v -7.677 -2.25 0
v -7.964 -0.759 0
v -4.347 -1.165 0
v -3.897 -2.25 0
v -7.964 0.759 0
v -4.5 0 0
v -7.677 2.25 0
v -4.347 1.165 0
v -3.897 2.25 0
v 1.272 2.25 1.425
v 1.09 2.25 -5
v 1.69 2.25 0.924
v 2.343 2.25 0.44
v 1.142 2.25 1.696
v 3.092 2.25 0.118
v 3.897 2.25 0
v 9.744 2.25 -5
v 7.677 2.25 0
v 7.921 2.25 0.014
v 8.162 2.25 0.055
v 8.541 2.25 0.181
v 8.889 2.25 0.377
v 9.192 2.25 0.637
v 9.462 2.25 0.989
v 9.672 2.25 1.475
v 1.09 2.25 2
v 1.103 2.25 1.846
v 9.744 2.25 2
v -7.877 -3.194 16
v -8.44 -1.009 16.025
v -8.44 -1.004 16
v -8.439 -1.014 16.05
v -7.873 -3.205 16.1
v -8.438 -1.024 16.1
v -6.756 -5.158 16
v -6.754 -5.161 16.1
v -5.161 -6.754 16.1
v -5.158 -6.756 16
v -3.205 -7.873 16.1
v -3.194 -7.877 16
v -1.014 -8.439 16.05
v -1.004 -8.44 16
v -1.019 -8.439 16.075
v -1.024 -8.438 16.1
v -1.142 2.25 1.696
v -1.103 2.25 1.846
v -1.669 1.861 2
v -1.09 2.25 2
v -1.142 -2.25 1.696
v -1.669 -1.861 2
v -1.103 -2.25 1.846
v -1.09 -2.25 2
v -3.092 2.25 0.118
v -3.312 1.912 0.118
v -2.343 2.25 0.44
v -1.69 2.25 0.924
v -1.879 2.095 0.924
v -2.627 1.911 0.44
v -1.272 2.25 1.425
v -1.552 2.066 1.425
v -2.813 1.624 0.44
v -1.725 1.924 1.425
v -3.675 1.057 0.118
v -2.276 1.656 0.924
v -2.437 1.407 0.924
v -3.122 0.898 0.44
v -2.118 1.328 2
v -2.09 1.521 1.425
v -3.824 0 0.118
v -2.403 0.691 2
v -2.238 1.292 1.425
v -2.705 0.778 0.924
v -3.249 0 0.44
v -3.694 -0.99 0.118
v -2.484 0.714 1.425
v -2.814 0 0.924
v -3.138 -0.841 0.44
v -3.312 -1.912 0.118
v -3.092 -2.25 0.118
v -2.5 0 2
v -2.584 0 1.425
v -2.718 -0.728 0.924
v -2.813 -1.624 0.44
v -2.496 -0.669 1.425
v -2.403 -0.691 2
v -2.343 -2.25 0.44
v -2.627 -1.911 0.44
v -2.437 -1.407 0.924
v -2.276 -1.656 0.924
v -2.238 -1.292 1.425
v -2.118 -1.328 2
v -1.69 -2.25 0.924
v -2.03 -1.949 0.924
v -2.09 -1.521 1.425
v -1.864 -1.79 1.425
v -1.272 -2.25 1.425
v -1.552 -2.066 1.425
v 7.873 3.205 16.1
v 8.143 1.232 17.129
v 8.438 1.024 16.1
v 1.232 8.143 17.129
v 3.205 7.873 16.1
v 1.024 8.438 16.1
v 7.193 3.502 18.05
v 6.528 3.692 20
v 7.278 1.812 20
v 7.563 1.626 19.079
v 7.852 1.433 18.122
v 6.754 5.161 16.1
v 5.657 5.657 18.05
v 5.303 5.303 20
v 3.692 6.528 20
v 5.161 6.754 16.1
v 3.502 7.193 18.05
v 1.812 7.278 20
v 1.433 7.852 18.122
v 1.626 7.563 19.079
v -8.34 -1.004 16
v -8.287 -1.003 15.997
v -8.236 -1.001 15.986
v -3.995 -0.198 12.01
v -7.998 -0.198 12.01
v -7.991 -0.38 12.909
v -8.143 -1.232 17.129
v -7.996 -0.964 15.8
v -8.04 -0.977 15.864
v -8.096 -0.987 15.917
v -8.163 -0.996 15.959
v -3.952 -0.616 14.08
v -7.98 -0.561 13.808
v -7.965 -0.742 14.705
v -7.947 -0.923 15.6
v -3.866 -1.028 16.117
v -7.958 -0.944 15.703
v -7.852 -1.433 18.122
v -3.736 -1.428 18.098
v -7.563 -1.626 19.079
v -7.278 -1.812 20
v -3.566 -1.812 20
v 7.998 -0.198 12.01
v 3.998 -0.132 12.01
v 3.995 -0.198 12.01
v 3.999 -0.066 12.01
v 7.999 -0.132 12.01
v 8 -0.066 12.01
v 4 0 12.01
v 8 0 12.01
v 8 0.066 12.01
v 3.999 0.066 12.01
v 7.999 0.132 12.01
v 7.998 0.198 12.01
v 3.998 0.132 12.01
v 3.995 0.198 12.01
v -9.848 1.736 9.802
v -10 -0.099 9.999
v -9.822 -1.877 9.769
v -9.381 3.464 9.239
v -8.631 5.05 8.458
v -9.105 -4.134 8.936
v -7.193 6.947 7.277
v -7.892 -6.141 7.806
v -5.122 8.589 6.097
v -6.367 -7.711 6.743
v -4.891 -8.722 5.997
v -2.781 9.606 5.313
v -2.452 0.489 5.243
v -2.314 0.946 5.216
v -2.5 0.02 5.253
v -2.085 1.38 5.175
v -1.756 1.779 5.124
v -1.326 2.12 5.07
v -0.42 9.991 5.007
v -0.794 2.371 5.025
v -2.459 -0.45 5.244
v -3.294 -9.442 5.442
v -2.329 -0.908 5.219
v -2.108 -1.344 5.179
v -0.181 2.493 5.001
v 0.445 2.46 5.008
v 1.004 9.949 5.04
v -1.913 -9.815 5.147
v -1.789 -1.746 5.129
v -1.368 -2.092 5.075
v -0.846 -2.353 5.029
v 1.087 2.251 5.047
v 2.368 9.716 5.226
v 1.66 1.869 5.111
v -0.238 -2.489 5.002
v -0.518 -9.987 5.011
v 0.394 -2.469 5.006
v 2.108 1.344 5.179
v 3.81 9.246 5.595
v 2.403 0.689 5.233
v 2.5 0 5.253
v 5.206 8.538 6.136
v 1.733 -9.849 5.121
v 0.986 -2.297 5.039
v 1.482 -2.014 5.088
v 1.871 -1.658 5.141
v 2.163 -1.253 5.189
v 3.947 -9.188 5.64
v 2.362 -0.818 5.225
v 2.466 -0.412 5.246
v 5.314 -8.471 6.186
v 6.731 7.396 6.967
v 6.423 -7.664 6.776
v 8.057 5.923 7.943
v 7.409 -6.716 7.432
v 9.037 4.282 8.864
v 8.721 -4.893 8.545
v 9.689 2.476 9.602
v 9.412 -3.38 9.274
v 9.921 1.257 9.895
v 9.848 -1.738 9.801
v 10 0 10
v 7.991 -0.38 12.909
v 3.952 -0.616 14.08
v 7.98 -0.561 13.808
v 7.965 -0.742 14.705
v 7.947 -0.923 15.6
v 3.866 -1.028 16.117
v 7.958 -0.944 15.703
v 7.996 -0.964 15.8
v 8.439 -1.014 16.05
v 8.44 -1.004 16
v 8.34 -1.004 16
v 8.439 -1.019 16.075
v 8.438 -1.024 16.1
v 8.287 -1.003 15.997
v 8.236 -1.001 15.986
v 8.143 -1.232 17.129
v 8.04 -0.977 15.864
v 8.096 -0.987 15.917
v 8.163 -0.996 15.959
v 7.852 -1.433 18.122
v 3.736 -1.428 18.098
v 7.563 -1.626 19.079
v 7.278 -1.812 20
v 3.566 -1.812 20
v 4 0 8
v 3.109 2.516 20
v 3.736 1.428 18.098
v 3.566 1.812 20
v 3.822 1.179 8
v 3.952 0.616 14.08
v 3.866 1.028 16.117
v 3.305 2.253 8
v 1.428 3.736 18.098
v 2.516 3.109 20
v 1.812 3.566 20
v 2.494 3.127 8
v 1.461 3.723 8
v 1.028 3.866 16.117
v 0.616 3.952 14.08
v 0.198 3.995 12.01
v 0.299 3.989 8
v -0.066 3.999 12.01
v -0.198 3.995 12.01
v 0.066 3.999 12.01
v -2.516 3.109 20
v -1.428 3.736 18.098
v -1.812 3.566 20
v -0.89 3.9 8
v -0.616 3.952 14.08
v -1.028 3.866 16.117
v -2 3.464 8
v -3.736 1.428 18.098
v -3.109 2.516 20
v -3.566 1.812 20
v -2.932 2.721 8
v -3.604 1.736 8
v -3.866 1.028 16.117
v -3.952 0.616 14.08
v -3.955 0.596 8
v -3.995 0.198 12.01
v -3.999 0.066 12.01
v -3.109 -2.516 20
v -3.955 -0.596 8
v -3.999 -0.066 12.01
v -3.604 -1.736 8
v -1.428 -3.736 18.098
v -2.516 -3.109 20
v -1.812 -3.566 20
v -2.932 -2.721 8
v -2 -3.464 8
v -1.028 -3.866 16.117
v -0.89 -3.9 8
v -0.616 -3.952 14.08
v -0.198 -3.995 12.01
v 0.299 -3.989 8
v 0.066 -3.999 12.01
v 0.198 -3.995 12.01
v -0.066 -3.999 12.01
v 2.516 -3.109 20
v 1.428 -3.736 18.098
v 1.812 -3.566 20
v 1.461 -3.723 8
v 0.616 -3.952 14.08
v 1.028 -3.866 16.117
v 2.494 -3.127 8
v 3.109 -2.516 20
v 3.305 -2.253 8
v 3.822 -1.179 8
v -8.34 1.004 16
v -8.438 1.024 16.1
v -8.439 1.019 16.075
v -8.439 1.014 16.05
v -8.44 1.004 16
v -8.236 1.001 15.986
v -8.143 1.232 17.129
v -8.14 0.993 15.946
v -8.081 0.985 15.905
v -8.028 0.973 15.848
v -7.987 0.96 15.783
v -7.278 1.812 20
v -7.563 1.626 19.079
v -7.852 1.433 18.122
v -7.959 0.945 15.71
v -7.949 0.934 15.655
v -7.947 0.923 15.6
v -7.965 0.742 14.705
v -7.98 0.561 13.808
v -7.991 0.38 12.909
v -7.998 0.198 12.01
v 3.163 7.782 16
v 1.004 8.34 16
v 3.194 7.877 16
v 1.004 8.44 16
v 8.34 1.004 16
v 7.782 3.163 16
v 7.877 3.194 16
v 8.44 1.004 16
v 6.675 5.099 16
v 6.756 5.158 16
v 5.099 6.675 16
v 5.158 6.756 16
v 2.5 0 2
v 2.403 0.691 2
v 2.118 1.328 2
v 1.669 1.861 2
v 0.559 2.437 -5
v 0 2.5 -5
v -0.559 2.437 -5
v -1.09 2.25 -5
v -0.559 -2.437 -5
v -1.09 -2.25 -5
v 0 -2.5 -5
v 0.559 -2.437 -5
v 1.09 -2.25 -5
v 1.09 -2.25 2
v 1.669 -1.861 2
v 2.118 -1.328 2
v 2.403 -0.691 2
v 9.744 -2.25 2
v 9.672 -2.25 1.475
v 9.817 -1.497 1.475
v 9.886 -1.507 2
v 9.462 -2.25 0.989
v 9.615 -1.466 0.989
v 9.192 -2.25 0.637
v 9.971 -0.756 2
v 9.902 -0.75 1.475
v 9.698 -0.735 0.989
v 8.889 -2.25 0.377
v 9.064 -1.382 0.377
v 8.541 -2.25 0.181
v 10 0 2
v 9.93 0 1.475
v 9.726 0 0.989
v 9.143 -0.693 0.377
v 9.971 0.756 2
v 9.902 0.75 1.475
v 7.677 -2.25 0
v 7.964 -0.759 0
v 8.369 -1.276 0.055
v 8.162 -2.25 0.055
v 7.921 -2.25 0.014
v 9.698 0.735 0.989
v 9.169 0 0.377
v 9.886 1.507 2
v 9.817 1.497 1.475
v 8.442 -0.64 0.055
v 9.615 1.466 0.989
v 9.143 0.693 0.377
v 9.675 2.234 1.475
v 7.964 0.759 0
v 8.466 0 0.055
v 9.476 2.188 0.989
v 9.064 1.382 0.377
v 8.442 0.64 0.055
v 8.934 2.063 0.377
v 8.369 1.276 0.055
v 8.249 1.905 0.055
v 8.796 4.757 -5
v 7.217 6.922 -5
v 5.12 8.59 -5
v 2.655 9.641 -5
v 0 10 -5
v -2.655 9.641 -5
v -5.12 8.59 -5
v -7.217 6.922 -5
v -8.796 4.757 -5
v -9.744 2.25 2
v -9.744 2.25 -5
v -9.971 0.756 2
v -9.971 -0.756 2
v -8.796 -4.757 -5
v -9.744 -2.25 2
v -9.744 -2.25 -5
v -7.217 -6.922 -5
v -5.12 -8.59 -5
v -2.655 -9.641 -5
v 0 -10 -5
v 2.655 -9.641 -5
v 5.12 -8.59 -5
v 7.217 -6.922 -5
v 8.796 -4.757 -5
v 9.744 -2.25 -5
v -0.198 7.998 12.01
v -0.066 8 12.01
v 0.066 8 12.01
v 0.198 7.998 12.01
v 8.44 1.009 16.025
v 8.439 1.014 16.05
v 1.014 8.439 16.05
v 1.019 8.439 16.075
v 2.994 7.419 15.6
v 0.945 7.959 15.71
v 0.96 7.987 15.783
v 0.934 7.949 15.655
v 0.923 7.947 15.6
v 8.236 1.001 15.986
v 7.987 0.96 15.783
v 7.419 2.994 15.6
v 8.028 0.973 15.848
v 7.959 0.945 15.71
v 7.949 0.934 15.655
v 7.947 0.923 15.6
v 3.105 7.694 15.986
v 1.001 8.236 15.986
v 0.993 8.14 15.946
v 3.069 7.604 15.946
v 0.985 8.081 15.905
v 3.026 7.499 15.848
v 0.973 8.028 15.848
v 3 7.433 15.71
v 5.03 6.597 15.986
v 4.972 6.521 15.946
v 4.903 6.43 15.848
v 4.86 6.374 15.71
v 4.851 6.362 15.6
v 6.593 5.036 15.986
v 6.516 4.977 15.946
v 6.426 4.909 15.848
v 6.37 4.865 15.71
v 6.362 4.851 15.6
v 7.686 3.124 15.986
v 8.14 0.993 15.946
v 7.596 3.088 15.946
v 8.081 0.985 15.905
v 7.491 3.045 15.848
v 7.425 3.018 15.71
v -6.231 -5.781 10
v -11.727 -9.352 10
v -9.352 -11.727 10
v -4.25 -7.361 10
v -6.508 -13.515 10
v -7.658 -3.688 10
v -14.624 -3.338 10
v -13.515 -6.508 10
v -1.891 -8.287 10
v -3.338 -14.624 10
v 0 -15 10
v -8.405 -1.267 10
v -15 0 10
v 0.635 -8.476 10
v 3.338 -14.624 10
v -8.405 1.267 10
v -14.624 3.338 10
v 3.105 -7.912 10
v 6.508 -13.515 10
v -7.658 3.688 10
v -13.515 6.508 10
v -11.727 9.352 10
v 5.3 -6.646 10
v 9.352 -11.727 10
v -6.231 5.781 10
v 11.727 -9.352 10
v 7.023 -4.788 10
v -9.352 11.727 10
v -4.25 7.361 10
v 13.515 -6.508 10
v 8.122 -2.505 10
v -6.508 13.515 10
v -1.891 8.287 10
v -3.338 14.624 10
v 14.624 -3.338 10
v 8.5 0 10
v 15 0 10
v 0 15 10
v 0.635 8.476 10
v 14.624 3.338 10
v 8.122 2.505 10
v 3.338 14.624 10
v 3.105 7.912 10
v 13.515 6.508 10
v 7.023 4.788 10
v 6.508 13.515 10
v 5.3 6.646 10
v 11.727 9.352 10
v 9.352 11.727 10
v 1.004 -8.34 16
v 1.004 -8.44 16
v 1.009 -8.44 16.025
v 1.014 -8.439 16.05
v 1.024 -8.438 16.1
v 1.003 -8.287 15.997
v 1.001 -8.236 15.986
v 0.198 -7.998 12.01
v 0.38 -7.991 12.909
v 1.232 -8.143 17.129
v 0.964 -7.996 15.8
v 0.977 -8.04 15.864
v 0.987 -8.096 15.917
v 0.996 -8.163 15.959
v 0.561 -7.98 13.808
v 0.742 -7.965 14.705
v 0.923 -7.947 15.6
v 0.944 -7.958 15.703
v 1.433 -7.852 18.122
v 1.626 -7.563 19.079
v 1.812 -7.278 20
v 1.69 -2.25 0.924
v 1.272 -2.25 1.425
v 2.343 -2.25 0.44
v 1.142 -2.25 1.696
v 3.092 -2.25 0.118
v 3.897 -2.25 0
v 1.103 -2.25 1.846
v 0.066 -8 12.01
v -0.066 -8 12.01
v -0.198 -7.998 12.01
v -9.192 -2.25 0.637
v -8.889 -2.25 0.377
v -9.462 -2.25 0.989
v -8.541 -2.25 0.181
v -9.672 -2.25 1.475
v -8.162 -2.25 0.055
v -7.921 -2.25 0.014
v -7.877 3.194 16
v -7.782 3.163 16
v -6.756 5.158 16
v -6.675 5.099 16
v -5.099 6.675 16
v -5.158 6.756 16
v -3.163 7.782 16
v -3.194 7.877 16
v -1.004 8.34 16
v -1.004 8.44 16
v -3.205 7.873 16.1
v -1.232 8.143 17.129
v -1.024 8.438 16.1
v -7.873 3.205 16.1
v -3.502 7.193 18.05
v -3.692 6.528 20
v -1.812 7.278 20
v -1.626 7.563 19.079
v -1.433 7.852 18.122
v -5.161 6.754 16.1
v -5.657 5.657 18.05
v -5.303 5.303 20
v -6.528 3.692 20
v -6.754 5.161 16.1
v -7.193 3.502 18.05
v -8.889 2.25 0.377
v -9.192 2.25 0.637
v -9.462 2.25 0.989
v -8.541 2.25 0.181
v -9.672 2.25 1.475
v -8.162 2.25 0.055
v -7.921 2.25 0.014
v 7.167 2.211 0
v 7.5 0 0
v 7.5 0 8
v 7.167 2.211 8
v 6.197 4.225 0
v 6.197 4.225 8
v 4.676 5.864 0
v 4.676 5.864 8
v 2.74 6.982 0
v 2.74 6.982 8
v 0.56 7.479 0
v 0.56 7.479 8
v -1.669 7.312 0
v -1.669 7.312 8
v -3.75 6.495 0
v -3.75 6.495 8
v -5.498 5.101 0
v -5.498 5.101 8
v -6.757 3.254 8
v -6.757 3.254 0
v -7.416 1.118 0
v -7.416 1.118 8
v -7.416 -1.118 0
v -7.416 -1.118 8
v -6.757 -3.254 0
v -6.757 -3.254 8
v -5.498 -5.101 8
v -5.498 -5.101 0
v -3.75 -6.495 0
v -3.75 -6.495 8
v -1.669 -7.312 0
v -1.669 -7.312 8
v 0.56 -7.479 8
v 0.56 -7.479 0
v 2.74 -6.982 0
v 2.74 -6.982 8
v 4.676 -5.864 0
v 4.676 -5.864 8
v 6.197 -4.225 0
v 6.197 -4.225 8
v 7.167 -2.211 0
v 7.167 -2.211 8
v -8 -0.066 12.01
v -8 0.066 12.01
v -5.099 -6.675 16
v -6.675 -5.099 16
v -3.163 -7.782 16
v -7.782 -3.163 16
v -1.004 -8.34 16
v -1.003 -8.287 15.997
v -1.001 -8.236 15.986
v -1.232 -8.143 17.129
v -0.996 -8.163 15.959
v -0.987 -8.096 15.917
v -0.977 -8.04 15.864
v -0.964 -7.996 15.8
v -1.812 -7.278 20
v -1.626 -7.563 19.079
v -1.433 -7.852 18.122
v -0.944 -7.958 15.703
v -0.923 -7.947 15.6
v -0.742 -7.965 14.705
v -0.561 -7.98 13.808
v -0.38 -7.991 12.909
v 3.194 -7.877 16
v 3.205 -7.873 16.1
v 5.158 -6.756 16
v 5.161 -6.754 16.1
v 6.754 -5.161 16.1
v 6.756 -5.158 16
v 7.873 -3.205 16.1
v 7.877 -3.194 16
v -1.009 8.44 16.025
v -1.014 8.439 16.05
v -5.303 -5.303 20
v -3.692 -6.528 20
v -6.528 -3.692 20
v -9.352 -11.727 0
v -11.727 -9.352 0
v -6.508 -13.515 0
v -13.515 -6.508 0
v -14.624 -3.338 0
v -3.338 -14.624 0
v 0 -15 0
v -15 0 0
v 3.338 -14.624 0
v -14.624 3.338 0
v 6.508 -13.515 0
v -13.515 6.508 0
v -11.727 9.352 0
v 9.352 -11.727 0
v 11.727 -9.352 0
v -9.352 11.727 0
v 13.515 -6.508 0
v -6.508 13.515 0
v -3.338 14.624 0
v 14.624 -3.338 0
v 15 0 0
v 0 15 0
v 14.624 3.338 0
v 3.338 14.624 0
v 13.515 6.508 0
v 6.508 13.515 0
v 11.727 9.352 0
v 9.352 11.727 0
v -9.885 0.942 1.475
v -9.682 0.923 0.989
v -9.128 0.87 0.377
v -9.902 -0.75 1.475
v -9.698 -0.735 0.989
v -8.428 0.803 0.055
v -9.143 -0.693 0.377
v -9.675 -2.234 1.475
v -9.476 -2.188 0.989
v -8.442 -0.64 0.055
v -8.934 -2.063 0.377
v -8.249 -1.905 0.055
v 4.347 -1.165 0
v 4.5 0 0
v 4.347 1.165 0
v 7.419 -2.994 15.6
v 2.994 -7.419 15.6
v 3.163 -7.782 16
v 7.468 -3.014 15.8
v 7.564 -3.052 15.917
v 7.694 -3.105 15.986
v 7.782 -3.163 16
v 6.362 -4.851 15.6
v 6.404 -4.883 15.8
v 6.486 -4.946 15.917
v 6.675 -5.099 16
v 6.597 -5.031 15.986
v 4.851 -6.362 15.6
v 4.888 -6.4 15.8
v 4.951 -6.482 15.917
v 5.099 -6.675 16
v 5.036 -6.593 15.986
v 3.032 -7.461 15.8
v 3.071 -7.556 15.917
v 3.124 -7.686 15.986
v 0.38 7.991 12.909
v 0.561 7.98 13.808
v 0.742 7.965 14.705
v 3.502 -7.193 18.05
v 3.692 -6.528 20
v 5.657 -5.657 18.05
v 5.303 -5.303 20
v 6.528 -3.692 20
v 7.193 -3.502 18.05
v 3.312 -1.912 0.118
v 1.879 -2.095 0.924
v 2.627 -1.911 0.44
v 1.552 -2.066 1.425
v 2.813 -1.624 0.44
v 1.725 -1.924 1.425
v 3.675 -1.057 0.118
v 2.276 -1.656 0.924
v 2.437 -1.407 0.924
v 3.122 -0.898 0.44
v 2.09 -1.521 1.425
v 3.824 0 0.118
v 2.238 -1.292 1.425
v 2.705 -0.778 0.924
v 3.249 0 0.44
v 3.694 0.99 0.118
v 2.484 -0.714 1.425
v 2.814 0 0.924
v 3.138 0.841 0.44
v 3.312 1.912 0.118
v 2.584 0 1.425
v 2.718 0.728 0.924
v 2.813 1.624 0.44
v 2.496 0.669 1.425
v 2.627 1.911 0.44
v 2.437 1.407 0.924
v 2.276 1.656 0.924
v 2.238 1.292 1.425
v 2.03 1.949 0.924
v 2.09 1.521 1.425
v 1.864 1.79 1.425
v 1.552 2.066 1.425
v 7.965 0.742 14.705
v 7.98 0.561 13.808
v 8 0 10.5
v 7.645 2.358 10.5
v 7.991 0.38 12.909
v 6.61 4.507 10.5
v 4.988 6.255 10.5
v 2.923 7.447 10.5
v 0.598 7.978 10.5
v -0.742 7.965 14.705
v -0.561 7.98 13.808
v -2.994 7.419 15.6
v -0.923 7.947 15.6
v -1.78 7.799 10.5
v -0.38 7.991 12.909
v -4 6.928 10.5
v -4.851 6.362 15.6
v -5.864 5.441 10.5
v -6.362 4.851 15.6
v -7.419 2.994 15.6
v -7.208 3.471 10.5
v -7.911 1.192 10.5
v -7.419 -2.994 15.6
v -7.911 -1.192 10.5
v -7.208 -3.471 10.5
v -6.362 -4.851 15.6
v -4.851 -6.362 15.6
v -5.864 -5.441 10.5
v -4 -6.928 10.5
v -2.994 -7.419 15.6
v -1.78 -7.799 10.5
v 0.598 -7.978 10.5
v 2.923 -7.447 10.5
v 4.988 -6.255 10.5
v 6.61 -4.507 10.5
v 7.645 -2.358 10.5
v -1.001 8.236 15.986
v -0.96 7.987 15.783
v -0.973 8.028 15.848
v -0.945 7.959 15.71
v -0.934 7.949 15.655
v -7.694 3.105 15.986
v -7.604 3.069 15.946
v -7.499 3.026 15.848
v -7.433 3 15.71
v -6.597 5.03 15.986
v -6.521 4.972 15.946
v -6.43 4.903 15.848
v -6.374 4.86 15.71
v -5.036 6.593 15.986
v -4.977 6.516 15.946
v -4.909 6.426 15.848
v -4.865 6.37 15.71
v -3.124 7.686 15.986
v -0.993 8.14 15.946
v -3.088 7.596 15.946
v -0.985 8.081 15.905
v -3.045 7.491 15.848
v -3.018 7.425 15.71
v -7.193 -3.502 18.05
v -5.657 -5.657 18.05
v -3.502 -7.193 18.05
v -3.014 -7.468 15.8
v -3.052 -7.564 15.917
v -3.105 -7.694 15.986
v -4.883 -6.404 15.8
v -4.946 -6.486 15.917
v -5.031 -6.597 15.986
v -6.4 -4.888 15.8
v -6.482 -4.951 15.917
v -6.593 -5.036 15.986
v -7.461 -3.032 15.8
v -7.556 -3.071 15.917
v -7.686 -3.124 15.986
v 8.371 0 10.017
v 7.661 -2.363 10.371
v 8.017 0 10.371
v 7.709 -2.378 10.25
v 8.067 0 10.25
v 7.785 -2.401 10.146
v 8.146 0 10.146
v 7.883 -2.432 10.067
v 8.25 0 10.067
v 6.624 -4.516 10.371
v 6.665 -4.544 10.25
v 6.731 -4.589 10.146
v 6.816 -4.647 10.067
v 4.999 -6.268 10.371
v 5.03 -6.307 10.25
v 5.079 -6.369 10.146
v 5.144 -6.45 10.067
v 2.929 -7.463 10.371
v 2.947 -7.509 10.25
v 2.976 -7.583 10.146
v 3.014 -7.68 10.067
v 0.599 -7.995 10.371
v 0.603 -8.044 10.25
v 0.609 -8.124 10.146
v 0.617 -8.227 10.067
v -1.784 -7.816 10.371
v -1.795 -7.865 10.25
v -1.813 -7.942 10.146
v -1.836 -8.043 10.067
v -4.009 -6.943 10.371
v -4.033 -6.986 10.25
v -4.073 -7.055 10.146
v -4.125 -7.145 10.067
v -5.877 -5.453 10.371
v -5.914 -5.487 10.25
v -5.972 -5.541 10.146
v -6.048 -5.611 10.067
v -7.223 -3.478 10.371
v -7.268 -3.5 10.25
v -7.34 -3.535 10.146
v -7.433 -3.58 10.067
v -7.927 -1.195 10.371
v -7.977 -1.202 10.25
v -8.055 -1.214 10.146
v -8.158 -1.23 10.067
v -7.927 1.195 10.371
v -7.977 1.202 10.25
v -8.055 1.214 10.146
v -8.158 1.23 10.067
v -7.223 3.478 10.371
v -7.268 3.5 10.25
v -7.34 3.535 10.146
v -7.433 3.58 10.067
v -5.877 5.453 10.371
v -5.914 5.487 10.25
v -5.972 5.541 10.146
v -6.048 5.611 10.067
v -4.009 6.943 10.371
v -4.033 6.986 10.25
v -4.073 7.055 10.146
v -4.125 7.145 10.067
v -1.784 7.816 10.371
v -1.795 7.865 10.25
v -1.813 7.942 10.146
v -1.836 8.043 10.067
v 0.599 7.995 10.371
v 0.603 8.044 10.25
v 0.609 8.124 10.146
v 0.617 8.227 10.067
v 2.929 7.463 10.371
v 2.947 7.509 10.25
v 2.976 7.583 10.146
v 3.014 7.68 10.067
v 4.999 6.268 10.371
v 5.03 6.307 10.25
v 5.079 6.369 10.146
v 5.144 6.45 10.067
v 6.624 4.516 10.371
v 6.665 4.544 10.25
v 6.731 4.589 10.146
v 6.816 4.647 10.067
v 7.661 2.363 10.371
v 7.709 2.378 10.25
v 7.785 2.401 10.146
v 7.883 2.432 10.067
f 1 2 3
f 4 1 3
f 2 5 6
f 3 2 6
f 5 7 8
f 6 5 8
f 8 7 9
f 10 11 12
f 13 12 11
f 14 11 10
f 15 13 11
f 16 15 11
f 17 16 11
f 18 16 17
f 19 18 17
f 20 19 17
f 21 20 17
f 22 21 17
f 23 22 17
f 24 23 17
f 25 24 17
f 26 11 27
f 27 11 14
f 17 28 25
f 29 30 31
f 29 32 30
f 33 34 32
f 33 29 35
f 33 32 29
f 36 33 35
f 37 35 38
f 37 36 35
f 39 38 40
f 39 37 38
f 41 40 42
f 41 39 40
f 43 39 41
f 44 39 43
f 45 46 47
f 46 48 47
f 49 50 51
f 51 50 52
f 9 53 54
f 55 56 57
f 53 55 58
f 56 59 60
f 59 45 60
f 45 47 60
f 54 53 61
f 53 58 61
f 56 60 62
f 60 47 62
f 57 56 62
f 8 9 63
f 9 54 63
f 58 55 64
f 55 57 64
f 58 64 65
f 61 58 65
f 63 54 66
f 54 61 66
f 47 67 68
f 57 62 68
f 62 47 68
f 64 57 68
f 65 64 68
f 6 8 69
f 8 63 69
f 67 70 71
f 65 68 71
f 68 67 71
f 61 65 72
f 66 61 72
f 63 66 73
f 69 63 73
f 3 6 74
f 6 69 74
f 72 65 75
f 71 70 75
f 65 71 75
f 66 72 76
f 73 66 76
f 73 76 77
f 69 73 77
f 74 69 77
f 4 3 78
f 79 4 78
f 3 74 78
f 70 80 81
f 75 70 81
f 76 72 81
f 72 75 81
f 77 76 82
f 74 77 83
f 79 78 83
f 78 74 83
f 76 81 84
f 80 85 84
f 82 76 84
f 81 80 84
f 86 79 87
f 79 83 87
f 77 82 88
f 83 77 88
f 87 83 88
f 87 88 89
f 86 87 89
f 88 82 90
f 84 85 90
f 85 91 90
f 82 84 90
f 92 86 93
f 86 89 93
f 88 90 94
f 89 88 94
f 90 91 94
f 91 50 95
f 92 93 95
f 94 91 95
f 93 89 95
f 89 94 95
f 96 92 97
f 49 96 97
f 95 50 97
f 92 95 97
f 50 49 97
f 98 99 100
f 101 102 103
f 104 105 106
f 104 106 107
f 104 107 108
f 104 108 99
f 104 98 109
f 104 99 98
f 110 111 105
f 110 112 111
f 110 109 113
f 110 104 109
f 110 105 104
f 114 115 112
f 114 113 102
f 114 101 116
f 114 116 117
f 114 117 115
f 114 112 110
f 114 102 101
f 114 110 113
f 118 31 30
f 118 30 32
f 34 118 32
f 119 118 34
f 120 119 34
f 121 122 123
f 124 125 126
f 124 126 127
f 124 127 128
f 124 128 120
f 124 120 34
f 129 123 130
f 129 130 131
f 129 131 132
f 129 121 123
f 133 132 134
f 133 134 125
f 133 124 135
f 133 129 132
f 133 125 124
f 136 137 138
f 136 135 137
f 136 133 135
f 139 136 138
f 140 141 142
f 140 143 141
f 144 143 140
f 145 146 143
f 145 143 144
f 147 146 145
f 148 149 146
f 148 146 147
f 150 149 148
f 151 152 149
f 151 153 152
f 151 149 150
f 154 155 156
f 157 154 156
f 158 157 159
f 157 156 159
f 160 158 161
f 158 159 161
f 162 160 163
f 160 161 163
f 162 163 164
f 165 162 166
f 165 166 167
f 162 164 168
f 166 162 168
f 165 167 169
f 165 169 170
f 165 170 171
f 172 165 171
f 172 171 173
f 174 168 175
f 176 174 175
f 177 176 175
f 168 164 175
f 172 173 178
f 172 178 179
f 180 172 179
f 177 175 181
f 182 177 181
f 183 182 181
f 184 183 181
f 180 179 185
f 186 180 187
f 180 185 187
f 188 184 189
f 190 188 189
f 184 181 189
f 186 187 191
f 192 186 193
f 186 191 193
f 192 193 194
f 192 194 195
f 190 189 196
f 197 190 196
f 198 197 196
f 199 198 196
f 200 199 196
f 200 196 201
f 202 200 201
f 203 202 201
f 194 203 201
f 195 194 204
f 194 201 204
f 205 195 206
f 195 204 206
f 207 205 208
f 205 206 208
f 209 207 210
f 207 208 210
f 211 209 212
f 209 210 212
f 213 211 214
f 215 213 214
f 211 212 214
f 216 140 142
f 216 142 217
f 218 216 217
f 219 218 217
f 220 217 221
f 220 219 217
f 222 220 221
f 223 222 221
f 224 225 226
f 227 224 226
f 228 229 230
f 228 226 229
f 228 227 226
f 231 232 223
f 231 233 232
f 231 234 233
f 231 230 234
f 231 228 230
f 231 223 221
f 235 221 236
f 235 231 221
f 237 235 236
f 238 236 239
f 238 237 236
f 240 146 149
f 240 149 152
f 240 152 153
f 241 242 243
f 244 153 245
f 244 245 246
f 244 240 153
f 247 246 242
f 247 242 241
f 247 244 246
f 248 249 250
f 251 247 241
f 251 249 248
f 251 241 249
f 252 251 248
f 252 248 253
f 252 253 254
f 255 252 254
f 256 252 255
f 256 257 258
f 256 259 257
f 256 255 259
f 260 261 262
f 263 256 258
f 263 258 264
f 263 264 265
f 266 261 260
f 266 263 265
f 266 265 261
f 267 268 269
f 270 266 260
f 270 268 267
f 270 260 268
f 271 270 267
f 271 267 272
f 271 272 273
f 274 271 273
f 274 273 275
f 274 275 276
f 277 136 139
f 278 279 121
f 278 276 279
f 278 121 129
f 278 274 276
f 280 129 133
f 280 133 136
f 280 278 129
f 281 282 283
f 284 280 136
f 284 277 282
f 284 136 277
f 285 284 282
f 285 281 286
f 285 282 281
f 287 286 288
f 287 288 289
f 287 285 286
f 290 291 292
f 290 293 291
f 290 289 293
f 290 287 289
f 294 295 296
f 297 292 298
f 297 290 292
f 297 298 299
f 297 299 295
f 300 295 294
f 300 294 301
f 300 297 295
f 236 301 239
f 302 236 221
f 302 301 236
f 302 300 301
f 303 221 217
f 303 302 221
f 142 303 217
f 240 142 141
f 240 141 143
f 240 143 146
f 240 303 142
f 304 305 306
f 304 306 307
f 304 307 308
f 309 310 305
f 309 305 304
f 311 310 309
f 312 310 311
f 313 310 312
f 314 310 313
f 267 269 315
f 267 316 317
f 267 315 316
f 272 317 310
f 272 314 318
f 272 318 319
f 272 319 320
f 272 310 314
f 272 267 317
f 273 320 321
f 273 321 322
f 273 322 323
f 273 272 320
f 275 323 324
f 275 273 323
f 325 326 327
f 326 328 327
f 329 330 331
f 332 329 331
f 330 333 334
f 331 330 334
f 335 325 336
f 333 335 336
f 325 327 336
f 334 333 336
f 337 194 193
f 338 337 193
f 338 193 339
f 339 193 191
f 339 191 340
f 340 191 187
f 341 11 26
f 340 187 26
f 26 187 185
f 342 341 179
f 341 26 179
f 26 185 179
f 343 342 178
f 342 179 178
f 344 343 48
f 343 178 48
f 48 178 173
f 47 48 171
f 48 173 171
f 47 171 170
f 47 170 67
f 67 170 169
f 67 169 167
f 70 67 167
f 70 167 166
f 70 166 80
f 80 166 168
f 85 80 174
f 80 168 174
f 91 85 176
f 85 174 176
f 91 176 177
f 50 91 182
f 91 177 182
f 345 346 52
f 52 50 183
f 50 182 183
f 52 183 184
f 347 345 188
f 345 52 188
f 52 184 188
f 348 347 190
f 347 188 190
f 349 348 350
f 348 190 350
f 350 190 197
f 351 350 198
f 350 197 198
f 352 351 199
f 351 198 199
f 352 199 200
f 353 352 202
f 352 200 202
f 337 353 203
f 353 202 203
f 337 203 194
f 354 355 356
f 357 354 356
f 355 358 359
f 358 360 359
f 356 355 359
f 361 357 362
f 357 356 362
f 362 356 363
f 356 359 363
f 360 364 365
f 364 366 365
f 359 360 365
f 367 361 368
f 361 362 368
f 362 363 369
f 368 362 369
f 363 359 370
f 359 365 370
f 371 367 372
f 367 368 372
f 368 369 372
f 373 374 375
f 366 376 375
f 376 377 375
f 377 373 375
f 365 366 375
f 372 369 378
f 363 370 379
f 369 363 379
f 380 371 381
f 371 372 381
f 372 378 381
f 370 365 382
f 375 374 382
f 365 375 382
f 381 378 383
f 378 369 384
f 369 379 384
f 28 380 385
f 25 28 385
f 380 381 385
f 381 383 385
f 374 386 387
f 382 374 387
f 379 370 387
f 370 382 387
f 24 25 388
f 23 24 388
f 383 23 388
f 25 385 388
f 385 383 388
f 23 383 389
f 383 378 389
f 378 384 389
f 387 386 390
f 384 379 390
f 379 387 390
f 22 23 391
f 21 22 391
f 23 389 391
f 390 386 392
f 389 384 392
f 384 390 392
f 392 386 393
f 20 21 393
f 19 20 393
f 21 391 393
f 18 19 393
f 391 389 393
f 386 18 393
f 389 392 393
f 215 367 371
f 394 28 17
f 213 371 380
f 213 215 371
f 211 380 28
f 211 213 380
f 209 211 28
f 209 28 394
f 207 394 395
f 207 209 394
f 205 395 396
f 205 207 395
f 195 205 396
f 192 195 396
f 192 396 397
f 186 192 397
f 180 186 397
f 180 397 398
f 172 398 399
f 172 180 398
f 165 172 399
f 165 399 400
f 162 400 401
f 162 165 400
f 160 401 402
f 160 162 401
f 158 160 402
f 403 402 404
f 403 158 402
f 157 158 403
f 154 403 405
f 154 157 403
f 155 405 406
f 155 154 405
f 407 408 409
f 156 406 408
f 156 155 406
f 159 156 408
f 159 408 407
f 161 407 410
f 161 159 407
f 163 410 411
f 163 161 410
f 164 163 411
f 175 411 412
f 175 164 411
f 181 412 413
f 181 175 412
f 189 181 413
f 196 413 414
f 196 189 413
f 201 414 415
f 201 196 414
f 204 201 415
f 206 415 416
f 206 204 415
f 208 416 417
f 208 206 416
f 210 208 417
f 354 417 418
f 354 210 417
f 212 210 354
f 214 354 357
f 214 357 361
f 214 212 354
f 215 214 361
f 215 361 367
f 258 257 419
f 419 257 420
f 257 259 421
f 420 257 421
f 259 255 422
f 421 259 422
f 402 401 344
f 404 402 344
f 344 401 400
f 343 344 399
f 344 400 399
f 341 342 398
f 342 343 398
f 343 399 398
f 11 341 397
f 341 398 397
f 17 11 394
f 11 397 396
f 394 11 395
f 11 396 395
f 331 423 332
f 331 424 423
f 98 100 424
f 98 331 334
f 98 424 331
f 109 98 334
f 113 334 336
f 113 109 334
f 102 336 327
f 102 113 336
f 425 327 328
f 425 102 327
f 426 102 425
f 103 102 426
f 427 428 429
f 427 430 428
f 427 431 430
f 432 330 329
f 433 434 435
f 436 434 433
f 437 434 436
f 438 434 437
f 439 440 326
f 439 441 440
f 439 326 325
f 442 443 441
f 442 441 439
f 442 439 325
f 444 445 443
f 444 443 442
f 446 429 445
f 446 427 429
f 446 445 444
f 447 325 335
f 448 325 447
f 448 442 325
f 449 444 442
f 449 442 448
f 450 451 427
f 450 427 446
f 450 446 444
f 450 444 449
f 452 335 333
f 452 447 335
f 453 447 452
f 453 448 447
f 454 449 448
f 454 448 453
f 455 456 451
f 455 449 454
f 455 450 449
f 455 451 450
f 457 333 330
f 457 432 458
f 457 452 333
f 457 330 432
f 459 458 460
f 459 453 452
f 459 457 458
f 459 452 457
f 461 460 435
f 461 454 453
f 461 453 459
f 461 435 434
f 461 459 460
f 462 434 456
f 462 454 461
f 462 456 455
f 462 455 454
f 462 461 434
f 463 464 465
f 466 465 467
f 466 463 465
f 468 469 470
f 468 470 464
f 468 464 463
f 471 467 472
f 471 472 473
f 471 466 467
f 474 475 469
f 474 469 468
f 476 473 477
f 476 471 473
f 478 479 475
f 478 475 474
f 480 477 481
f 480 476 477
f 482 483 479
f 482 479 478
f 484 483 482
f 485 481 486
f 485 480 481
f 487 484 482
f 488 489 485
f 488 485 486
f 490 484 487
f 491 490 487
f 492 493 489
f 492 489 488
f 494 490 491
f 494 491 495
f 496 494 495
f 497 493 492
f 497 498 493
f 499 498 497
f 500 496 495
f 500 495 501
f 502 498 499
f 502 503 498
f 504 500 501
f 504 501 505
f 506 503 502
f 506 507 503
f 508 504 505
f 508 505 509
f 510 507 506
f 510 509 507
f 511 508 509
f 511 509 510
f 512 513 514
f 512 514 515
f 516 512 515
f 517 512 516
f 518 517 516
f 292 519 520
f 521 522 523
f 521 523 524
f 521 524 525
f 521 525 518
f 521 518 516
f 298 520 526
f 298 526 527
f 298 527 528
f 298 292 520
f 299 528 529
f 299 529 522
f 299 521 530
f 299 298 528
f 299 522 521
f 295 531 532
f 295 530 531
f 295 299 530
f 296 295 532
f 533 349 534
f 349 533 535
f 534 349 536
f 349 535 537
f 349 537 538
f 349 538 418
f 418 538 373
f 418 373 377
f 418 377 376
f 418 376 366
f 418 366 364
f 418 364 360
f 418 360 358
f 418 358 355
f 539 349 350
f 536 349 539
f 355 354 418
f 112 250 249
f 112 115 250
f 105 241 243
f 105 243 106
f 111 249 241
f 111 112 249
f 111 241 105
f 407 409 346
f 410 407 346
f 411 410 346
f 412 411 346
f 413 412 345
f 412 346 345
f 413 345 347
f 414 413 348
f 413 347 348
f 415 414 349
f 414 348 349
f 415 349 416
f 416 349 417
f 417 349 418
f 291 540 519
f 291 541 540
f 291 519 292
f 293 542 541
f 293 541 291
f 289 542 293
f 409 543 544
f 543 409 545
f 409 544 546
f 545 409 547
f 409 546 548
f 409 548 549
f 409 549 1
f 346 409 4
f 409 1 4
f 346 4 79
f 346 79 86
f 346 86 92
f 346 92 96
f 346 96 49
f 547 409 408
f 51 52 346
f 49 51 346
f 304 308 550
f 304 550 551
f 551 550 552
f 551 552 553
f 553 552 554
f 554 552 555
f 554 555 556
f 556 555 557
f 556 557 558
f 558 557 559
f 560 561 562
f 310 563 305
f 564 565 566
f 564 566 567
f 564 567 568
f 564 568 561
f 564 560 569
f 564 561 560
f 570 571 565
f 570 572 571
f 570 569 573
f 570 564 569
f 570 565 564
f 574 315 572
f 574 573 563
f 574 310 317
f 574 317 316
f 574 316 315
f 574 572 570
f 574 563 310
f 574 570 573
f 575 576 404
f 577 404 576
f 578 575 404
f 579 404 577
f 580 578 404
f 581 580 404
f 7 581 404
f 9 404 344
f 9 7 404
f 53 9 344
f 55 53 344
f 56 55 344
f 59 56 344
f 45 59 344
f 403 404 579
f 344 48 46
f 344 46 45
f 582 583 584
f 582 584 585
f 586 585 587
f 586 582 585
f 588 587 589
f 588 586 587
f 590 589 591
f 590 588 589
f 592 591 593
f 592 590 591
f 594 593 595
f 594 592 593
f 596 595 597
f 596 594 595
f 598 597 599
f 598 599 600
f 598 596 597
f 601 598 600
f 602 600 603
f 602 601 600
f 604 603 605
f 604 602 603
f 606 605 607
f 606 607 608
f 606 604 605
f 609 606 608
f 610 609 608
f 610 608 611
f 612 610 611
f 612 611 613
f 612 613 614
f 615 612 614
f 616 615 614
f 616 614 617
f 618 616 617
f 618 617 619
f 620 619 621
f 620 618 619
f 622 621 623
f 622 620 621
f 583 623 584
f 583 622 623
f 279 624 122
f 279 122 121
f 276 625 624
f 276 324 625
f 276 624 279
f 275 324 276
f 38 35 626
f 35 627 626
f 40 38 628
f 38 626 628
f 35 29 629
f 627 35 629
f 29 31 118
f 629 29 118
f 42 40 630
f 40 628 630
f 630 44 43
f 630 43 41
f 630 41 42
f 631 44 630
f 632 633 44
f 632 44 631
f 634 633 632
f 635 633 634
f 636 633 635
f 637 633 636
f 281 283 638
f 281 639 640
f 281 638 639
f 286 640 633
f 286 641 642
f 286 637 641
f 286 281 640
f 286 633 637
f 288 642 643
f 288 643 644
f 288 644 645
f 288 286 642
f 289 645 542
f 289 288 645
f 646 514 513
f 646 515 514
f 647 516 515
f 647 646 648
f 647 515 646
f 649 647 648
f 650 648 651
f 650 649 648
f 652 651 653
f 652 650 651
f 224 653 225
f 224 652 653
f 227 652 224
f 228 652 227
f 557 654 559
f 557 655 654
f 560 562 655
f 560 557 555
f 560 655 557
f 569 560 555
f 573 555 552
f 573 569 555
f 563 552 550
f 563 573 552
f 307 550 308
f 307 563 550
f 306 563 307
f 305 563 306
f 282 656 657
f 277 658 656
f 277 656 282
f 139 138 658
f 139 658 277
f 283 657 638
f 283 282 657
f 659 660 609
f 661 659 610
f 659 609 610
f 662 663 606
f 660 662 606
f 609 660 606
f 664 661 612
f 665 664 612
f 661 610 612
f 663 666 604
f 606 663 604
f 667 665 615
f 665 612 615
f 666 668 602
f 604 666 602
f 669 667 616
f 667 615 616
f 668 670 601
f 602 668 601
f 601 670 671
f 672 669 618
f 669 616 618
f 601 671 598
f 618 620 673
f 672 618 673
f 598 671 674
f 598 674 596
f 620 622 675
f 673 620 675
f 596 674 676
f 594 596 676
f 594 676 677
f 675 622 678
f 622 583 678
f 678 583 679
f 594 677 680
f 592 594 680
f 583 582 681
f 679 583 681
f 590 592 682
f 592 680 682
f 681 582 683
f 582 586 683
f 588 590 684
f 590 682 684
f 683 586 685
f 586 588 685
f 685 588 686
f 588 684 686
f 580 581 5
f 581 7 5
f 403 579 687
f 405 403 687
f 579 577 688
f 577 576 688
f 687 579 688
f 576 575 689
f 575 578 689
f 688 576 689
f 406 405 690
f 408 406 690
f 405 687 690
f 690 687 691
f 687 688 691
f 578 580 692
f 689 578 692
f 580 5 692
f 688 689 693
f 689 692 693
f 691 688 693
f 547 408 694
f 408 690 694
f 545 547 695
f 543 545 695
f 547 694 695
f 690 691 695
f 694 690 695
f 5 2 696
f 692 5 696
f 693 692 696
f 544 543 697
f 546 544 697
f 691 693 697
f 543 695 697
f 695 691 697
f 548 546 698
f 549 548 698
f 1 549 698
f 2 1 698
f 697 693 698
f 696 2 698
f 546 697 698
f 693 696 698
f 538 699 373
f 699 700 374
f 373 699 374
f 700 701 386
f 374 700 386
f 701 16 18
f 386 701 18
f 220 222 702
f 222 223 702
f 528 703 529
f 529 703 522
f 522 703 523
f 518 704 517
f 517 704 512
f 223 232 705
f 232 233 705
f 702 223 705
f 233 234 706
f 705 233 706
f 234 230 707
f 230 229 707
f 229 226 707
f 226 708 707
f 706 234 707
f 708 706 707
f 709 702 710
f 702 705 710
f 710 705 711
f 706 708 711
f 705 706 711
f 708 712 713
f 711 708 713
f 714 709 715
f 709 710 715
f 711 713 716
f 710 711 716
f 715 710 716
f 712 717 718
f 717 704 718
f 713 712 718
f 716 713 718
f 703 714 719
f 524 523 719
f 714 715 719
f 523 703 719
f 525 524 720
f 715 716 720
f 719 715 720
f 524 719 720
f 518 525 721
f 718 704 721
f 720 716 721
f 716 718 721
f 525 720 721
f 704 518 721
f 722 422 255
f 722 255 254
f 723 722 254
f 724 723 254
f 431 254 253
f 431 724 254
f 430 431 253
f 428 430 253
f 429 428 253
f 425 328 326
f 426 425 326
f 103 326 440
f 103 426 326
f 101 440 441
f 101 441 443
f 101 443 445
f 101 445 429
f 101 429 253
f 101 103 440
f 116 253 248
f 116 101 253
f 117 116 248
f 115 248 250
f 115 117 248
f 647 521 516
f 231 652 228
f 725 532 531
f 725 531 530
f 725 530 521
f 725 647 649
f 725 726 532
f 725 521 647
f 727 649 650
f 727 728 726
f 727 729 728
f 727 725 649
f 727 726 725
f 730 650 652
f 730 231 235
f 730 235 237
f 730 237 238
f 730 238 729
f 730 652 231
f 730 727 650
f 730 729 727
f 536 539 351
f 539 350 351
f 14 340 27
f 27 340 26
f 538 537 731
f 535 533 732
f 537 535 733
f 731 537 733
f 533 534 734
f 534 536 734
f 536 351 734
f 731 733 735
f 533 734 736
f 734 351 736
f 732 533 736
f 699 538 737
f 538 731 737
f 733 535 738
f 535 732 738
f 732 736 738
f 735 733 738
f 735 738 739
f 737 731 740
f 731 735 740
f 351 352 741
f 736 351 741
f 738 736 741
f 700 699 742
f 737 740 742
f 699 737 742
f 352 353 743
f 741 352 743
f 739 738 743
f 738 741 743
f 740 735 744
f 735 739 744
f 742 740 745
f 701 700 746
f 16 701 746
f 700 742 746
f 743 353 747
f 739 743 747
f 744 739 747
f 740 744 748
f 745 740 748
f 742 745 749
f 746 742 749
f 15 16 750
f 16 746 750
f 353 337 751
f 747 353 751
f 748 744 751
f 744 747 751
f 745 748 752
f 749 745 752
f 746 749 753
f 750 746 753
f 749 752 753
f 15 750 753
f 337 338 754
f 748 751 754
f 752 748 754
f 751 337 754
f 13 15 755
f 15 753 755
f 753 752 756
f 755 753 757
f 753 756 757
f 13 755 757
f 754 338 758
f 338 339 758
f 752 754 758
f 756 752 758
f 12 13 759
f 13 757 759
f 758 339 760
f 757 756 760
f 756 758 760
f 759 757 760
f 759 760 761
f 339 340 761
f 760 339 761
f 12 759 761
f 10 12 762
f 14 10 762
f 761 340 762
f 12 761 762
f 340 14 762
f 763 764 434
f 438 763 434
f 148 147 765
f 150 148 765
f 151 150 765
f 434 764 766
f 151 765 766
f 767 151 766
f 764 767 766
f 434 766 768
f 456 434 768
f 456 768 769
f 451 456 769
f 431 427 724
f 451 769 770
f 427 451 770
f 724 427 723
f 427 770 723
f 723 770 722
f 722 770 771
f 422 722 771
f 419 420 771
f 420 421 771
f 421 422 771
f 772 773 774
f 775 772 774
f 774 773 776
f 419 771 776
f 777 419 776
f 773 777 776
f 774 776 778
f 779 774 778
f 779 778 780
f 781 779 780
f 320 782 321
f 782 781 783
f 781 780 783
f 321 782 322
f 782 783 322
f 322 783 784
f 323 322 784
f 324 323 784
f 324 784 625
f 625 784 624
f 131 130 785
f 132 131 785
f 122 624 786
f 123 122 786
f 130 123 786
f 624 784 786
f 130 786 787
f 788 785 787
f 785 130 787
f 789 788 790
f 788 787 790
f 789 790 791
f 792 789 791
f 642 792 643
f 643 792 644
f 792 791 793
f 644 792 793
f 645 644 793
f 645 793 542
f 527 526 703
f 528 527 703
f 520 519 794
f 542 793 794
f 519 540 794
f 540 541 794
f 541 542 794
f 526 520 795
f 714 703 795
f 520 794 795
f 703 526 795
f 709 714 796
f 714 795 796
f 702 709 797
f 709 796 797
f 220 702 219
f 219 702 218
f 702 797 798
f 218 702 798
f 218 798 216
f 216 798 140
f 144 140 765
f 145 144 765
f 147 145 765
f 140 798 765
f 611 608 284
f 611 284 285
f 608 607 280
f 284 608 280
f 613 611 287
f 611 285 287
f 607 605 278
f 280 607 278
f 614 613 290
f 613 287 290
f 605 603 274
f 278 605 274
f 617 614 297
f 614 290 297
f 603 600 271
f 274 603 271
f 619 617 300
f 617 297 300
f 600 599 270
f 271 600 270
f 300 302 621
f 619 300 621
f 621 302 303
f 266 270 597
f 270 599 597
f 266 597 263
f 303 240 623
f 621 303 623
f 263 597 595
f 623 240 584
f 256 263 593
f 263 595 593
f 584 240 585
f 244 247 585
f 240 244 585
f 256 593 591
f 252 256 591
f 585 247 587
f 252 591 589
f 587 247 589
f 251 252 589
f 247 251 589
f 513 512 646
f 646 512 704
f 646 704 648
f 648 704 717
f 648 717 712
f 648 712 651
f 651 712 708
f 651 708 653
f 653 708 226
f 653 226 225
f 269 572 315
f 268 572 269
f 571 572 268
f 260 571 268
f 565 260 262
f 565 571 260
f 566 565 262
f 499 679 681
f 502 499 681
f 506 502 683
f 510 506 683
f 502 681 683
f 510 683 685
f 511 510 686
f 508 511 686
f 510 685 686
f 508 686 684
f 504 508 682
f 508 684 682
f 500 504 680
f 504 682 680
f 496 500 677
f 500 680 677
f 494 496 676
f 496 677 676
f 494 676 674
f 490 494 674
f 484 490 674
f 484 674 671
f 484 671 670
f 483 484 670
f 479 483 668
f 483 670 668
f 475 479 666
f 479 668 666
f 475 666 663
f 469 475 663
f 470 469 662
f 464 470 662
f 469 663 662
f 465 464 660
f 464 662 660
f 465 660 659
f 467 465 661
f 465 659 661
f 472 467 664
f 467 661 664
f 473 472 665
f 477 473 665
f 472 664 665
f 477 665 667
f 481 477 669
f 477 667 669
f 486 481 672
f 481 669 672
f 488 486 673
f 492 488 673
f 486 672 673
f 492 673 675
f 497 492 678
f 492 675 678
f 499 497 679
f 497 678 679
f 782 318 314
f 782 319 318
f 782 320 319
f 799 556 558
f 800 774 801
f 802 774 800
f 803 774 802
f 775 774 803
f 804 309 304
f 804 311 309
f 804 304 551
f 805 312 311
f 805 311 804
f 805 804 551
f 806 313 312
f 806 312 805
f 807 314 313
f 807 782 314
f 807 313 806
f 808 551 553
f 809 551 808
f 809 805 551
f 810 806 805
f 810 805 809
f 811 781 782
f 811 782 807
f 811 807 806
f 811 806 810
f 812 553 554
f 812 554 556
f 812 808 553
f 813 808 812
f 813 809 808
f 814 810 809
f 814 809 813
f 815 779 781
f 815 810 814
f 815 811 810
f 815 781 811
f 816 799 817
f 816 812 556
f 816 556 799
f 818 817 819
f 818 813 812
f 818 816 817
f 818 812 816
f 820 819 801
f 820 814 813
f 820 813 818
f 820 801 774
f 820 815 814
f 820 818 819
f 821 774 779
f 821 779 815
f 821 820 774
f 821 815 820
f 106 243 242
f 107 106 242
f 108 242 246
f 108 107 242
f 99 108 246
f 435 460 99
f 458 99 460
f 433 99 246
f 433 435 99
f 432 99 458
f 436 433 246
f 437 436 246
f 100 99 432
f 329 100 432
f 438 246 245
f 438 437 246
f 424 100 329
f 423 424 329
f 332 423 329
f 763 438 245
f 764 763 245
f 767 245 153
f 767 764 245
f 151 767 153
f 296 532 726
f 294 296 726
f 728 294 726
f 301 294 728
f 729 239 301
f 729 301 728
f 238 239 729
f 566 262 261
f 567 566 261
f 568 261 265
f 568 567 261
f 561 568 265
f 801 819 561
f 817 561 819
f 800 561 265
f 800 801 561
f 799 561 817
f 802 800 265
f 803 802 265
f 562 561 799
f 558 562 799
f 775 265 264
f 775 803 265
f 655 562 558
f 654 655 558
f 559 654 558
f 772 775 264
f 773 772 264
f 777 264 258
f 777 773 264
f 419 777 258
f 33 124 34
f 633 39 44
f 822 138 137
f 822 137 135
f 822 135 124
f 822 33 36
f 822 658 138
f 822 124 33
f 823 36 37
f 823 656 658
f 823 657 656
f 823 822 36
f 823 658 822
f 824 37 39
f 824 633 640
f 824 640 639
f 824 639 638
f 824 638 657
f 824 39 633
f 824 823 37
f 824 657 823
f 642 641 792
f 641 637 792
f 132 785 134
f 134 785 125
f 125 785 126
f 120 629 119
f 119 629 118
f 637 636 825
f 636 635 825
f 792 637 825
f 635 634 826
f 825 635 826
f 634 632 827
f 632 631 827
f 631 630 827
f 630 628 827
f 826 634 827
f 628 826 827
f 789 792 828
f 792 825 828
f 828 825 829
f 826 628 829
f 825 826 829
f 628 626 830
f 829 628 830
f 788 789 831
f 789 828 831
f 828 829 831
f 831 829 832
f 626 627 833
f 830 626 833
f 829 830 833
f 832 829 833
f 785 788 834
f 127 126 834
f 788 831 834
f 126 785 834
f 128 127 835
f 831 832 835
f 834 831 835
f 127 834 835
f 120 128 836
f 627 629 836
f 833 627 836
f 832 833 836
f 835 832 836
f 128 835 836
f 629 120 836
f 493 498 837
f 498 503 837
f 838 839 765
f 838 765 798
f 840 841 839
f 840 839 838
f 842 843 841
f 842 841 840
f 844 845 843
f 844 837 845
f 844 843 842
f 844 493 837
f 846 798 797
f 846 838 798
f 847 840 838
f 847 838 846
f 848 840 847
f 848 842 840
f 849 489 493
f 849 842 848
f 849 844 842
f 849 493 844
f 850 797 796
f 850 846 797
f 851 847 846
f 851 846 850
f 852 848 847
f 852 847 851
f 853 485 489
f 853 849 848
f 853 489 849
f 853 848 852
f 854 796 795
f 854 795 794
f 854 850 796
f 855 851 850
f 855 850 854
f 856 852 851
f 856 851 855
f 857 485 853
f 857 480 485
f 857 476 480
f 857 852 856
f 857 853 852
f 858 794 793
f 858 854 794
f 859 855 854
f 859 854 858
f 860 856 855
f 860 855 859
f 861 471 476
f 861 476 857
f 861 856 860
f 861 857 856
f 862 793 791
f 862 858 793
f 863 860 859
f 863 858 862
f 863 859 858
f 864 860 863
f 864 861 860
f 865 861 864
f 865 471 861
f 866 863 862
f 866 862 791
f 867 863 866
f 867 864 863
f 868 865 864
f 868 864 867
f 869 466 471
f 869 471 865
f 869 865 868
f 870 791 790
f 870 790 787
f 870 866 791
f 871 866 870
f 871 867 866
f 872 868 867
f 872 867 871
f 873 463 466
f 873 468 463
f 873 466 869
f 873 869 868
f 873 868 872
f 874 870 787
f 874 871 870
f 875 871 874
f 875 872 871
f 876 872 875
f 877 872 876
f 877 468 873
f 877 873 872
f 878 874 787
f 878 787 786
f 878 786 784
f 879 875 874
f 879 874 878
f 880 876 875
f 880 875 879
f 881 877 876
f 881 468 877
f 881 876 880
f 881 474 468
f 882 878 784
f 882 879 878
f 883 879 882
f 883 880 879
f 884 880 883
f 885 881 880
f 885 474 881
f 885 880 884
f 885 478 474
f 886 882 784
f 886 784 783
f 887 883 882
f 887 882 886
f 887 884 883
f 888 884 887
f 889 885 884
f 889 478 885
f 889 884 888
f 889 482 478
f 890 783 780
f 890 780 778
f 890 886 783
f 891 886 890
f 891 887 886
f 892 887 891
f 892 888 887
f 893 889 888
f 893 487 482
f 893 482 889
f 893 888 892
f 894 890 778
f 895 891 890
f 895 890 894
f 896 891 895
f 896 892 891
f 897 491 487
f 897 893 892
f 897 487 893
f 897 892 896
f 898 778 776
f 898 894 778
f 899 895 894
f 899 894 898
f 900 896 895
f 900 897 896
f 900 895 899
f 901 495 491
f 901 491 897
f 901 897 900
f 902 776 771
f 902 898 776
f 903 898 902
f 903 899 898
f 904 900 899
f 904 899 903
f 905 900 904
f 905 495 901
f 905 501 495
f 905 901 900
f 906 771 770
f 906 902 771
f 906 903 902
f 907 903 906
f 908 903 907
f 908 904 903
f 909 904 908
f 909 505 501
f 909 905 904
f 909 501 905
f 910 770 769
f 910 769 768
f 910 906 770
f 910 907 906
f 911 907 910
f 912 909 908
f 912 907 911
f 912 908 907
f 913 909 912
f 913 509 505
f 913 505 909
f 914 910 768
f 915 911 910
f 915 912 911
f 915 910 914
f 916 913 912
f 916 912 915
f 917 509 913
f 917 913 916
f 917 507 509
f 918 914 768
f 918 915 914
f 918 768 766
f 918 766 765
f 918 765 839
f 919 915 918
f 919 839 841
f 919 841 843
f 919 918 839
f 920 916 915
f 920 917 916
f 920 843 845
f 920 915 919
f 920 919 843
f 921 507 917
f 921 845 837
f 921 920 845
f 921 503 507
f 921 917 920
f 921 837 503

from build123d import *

# Parameters (mm, degrees)
SKETCH_R        = 10
PAD_DEPTH       = 10
PAD_DEPTH_BACK  = 5
SKETCH001_R     = 12.5
POCKET_DEPTH    = 11
SKETCH003_R     = 2.5
POCKET002_DEPTH = 7.5
SKETCH004_W     = 40
SKETCH004_H     = 4.5
POCKET003_DEPTH = 8
FILLET_R        = 2
SKETCH005_R     = 8
PAD001_DEPTH    = 20
SKETCH006_R     = 15
PAD002_DEPTH    = 10
SKETCH008_R     = 8.5
PAD003_DEPTH    = 4
CHAMFER_SIZE2   = 1
CHAMFER_SIZE    = 3.9
SKETCH009_R     = 4
POCKET004_DEPTH = 22
SKETCH010_R     = 7.5
POCKET005_DEPTH = 8
POCKET006_DEPTH = 11
FILLET001_R     = 0.4
FILLET002_R     = 0.5
CHAMFER001_SIZE = 1
POCKET007_DEPTH = 10
CHAMFER002_SIZE = 1


with BuildPart() as feet2:
    # Sketch (on XY_Plane of Origin) → Pad (new body, two sides)
    with BuildSketch(Plane.XY) as pad_sk:
        Circle(SKETCH_R)
    extrude(amount=PAD_DEPTH)
    extrude(pad_sk.sketch, amount=-PAD_DEPTH_BACK)

    # Sketch001 (on XZ_Plane of Origin) → Pocket (cut, symmetric)
    with BuildSketch(Plane.XZ):
        with Locations((0, 17.5)):
            Circle(SKETCH001_R)
    extrude(amount=POCKET_DEPTH, both=True, mode=Mode.SUBTRACT)

    # Sketch003 (on XY_Plane of Origin) → Pocket002 (cut, symmetric)
    with BuildSketch(Plane.XY):
        Circle(SKETCH003_R)
    extrude(amount=POCKET002_DEPTH, both=True, mode=Mode.SUBTRACT)

    # Sketch004 (on XY_Plane of Origin) → Pocket003 (cut)
    with BuildSketch(Plane.XY):
        Rectangle(SKETCH004_W, SKETCH004_H)
    extrude(amount=-POCKET003_DEPTH, mode=Mode.SUBTRACT)

    # Fillet
    fillet_edges = [feet2.edges().sort_by_distance(p)[0] for p in [
        (9.93569, 1.132282, 0),
        (2.118291, -1.327721, 0),
        (-10, 0, 0),
        (-2.5, 0, 0),
    ]]
    fillet(fillet_edges, radius=FILLET_R)


with BuildPart() as feet3:
    # Sketch005 (on XY_Plane001 of Origin002) → Pad001 (new body)
    with BuildSketch(Plane.XY):
        Circle(SKETCH005_R)
    extrude(amount=PAD001_DEPTH)

    # Sketch006 (on XY_Plane001 of Origin002) → Pad002 (join)
    with BuildSketch(Plane.XY):
        Circle(SKETCH006_R)
    extrude(amount=PAD002_DEPTH)

    # Sketch008 (on XY_Plane001 of Origin002) → Pad003 (join)
    with BuildSketch(Plane.XY.offset(20)):
        Circle(SKETCH008_R)
    extrude(amount=-PAD003_DEPTH)

    # Chamfer
    chamfer_edges = [feet3.edges().sort_by_distance(p)[0] for p in [
        (-8.5, 0, 20),
    ]]
    chamfer_side = feet3.faces().sort_by_distance((-8.5, 0, 18))[0]
    chamfer(chamfer_edges, length=CHAMFER_SIZE, length2=CHAMFER_SIZE2, reference=chamfer_side)

    # Sketch009 (on XY_Plane001 of Origin002) → Pocket004 (cut)
    with BuildSketch(Plane.XY):
        Circle(SKETCH009_R)
    extrude(amount=POCKET004_DEPTH, mode=Mode.SUBTRACT)

    # Sketch010 (on XY_Plane001 of Origin002) → Pocket005 (cut)
    with BuildSketch(Plane.XY):
        Circle(SKETCH010_R)
    extrude(amount=POCKET005_DEPTH, mode=Mode.SUBTRACT)

    # Sketch011 (on YZ_Plane001 of Origin002) → Pocket006 (cut, symmetric)
    with BuildSketch(Plane.YZ):
        Polygon((0, 11.029764), (-2, 20.929764), (2, 20.929764), align=None)
    extrude(amount=POCKET006_DEPTH, both=True, mode=Mode.SUBTRACT)

    # Fillet001
    fillet001_edges = [feet3.edges().sort_by_distance(p)[0] for p in [
        (0, -8, 16),
        (0, 8, 16),
    ]]
    fillet(fillet001_edges, radius=FILLET001_R)

    # Fillet002
    fillet002_edges = [feet3.edges().sort_by_distance(p)[0] for p in [
        (-8, 0, 10),
    ]]
    fillet(fillet002_edges, radius=FILLET002_R)

    # Chamfer001
    chamfer001_edges = [feet3.edges().sort_by_distance(p)[0] for p in [
        (6, 0, 11.029764),
        (-6, 0, 11.029764),
    ]]
    chamfer(chamfer001_edges, length=CHAMFER001_SIZE)

    # Sketch012 (on YZ_Plane001 of Origin002) → Pocket007 (cut, symmetric)
    with BuildSketch(Plane(origin=(0, 0, 0), x_dir=(-1, 0, 0), z_dir=(0, 1, 0))):
        Polygon((0, 11.029764), (-2, 20.929764), (2, 20.929764), align=None)
    extrude(amount=POCKET007_DEPTH, both=True, mode=Mode.SUBTRACT)

    # Chamfer002
    chamfer002_edges = [feet3.edges().sort_by_distance(p)[0] for p in [
        (0, -6, 11.029764),
        (0, 6, 11.029764),
    ]]
    chamfer(chamfer002_edges, length=CHAMFER002_SIZE)


solid = Compound([feet2.part, feet3.part])
